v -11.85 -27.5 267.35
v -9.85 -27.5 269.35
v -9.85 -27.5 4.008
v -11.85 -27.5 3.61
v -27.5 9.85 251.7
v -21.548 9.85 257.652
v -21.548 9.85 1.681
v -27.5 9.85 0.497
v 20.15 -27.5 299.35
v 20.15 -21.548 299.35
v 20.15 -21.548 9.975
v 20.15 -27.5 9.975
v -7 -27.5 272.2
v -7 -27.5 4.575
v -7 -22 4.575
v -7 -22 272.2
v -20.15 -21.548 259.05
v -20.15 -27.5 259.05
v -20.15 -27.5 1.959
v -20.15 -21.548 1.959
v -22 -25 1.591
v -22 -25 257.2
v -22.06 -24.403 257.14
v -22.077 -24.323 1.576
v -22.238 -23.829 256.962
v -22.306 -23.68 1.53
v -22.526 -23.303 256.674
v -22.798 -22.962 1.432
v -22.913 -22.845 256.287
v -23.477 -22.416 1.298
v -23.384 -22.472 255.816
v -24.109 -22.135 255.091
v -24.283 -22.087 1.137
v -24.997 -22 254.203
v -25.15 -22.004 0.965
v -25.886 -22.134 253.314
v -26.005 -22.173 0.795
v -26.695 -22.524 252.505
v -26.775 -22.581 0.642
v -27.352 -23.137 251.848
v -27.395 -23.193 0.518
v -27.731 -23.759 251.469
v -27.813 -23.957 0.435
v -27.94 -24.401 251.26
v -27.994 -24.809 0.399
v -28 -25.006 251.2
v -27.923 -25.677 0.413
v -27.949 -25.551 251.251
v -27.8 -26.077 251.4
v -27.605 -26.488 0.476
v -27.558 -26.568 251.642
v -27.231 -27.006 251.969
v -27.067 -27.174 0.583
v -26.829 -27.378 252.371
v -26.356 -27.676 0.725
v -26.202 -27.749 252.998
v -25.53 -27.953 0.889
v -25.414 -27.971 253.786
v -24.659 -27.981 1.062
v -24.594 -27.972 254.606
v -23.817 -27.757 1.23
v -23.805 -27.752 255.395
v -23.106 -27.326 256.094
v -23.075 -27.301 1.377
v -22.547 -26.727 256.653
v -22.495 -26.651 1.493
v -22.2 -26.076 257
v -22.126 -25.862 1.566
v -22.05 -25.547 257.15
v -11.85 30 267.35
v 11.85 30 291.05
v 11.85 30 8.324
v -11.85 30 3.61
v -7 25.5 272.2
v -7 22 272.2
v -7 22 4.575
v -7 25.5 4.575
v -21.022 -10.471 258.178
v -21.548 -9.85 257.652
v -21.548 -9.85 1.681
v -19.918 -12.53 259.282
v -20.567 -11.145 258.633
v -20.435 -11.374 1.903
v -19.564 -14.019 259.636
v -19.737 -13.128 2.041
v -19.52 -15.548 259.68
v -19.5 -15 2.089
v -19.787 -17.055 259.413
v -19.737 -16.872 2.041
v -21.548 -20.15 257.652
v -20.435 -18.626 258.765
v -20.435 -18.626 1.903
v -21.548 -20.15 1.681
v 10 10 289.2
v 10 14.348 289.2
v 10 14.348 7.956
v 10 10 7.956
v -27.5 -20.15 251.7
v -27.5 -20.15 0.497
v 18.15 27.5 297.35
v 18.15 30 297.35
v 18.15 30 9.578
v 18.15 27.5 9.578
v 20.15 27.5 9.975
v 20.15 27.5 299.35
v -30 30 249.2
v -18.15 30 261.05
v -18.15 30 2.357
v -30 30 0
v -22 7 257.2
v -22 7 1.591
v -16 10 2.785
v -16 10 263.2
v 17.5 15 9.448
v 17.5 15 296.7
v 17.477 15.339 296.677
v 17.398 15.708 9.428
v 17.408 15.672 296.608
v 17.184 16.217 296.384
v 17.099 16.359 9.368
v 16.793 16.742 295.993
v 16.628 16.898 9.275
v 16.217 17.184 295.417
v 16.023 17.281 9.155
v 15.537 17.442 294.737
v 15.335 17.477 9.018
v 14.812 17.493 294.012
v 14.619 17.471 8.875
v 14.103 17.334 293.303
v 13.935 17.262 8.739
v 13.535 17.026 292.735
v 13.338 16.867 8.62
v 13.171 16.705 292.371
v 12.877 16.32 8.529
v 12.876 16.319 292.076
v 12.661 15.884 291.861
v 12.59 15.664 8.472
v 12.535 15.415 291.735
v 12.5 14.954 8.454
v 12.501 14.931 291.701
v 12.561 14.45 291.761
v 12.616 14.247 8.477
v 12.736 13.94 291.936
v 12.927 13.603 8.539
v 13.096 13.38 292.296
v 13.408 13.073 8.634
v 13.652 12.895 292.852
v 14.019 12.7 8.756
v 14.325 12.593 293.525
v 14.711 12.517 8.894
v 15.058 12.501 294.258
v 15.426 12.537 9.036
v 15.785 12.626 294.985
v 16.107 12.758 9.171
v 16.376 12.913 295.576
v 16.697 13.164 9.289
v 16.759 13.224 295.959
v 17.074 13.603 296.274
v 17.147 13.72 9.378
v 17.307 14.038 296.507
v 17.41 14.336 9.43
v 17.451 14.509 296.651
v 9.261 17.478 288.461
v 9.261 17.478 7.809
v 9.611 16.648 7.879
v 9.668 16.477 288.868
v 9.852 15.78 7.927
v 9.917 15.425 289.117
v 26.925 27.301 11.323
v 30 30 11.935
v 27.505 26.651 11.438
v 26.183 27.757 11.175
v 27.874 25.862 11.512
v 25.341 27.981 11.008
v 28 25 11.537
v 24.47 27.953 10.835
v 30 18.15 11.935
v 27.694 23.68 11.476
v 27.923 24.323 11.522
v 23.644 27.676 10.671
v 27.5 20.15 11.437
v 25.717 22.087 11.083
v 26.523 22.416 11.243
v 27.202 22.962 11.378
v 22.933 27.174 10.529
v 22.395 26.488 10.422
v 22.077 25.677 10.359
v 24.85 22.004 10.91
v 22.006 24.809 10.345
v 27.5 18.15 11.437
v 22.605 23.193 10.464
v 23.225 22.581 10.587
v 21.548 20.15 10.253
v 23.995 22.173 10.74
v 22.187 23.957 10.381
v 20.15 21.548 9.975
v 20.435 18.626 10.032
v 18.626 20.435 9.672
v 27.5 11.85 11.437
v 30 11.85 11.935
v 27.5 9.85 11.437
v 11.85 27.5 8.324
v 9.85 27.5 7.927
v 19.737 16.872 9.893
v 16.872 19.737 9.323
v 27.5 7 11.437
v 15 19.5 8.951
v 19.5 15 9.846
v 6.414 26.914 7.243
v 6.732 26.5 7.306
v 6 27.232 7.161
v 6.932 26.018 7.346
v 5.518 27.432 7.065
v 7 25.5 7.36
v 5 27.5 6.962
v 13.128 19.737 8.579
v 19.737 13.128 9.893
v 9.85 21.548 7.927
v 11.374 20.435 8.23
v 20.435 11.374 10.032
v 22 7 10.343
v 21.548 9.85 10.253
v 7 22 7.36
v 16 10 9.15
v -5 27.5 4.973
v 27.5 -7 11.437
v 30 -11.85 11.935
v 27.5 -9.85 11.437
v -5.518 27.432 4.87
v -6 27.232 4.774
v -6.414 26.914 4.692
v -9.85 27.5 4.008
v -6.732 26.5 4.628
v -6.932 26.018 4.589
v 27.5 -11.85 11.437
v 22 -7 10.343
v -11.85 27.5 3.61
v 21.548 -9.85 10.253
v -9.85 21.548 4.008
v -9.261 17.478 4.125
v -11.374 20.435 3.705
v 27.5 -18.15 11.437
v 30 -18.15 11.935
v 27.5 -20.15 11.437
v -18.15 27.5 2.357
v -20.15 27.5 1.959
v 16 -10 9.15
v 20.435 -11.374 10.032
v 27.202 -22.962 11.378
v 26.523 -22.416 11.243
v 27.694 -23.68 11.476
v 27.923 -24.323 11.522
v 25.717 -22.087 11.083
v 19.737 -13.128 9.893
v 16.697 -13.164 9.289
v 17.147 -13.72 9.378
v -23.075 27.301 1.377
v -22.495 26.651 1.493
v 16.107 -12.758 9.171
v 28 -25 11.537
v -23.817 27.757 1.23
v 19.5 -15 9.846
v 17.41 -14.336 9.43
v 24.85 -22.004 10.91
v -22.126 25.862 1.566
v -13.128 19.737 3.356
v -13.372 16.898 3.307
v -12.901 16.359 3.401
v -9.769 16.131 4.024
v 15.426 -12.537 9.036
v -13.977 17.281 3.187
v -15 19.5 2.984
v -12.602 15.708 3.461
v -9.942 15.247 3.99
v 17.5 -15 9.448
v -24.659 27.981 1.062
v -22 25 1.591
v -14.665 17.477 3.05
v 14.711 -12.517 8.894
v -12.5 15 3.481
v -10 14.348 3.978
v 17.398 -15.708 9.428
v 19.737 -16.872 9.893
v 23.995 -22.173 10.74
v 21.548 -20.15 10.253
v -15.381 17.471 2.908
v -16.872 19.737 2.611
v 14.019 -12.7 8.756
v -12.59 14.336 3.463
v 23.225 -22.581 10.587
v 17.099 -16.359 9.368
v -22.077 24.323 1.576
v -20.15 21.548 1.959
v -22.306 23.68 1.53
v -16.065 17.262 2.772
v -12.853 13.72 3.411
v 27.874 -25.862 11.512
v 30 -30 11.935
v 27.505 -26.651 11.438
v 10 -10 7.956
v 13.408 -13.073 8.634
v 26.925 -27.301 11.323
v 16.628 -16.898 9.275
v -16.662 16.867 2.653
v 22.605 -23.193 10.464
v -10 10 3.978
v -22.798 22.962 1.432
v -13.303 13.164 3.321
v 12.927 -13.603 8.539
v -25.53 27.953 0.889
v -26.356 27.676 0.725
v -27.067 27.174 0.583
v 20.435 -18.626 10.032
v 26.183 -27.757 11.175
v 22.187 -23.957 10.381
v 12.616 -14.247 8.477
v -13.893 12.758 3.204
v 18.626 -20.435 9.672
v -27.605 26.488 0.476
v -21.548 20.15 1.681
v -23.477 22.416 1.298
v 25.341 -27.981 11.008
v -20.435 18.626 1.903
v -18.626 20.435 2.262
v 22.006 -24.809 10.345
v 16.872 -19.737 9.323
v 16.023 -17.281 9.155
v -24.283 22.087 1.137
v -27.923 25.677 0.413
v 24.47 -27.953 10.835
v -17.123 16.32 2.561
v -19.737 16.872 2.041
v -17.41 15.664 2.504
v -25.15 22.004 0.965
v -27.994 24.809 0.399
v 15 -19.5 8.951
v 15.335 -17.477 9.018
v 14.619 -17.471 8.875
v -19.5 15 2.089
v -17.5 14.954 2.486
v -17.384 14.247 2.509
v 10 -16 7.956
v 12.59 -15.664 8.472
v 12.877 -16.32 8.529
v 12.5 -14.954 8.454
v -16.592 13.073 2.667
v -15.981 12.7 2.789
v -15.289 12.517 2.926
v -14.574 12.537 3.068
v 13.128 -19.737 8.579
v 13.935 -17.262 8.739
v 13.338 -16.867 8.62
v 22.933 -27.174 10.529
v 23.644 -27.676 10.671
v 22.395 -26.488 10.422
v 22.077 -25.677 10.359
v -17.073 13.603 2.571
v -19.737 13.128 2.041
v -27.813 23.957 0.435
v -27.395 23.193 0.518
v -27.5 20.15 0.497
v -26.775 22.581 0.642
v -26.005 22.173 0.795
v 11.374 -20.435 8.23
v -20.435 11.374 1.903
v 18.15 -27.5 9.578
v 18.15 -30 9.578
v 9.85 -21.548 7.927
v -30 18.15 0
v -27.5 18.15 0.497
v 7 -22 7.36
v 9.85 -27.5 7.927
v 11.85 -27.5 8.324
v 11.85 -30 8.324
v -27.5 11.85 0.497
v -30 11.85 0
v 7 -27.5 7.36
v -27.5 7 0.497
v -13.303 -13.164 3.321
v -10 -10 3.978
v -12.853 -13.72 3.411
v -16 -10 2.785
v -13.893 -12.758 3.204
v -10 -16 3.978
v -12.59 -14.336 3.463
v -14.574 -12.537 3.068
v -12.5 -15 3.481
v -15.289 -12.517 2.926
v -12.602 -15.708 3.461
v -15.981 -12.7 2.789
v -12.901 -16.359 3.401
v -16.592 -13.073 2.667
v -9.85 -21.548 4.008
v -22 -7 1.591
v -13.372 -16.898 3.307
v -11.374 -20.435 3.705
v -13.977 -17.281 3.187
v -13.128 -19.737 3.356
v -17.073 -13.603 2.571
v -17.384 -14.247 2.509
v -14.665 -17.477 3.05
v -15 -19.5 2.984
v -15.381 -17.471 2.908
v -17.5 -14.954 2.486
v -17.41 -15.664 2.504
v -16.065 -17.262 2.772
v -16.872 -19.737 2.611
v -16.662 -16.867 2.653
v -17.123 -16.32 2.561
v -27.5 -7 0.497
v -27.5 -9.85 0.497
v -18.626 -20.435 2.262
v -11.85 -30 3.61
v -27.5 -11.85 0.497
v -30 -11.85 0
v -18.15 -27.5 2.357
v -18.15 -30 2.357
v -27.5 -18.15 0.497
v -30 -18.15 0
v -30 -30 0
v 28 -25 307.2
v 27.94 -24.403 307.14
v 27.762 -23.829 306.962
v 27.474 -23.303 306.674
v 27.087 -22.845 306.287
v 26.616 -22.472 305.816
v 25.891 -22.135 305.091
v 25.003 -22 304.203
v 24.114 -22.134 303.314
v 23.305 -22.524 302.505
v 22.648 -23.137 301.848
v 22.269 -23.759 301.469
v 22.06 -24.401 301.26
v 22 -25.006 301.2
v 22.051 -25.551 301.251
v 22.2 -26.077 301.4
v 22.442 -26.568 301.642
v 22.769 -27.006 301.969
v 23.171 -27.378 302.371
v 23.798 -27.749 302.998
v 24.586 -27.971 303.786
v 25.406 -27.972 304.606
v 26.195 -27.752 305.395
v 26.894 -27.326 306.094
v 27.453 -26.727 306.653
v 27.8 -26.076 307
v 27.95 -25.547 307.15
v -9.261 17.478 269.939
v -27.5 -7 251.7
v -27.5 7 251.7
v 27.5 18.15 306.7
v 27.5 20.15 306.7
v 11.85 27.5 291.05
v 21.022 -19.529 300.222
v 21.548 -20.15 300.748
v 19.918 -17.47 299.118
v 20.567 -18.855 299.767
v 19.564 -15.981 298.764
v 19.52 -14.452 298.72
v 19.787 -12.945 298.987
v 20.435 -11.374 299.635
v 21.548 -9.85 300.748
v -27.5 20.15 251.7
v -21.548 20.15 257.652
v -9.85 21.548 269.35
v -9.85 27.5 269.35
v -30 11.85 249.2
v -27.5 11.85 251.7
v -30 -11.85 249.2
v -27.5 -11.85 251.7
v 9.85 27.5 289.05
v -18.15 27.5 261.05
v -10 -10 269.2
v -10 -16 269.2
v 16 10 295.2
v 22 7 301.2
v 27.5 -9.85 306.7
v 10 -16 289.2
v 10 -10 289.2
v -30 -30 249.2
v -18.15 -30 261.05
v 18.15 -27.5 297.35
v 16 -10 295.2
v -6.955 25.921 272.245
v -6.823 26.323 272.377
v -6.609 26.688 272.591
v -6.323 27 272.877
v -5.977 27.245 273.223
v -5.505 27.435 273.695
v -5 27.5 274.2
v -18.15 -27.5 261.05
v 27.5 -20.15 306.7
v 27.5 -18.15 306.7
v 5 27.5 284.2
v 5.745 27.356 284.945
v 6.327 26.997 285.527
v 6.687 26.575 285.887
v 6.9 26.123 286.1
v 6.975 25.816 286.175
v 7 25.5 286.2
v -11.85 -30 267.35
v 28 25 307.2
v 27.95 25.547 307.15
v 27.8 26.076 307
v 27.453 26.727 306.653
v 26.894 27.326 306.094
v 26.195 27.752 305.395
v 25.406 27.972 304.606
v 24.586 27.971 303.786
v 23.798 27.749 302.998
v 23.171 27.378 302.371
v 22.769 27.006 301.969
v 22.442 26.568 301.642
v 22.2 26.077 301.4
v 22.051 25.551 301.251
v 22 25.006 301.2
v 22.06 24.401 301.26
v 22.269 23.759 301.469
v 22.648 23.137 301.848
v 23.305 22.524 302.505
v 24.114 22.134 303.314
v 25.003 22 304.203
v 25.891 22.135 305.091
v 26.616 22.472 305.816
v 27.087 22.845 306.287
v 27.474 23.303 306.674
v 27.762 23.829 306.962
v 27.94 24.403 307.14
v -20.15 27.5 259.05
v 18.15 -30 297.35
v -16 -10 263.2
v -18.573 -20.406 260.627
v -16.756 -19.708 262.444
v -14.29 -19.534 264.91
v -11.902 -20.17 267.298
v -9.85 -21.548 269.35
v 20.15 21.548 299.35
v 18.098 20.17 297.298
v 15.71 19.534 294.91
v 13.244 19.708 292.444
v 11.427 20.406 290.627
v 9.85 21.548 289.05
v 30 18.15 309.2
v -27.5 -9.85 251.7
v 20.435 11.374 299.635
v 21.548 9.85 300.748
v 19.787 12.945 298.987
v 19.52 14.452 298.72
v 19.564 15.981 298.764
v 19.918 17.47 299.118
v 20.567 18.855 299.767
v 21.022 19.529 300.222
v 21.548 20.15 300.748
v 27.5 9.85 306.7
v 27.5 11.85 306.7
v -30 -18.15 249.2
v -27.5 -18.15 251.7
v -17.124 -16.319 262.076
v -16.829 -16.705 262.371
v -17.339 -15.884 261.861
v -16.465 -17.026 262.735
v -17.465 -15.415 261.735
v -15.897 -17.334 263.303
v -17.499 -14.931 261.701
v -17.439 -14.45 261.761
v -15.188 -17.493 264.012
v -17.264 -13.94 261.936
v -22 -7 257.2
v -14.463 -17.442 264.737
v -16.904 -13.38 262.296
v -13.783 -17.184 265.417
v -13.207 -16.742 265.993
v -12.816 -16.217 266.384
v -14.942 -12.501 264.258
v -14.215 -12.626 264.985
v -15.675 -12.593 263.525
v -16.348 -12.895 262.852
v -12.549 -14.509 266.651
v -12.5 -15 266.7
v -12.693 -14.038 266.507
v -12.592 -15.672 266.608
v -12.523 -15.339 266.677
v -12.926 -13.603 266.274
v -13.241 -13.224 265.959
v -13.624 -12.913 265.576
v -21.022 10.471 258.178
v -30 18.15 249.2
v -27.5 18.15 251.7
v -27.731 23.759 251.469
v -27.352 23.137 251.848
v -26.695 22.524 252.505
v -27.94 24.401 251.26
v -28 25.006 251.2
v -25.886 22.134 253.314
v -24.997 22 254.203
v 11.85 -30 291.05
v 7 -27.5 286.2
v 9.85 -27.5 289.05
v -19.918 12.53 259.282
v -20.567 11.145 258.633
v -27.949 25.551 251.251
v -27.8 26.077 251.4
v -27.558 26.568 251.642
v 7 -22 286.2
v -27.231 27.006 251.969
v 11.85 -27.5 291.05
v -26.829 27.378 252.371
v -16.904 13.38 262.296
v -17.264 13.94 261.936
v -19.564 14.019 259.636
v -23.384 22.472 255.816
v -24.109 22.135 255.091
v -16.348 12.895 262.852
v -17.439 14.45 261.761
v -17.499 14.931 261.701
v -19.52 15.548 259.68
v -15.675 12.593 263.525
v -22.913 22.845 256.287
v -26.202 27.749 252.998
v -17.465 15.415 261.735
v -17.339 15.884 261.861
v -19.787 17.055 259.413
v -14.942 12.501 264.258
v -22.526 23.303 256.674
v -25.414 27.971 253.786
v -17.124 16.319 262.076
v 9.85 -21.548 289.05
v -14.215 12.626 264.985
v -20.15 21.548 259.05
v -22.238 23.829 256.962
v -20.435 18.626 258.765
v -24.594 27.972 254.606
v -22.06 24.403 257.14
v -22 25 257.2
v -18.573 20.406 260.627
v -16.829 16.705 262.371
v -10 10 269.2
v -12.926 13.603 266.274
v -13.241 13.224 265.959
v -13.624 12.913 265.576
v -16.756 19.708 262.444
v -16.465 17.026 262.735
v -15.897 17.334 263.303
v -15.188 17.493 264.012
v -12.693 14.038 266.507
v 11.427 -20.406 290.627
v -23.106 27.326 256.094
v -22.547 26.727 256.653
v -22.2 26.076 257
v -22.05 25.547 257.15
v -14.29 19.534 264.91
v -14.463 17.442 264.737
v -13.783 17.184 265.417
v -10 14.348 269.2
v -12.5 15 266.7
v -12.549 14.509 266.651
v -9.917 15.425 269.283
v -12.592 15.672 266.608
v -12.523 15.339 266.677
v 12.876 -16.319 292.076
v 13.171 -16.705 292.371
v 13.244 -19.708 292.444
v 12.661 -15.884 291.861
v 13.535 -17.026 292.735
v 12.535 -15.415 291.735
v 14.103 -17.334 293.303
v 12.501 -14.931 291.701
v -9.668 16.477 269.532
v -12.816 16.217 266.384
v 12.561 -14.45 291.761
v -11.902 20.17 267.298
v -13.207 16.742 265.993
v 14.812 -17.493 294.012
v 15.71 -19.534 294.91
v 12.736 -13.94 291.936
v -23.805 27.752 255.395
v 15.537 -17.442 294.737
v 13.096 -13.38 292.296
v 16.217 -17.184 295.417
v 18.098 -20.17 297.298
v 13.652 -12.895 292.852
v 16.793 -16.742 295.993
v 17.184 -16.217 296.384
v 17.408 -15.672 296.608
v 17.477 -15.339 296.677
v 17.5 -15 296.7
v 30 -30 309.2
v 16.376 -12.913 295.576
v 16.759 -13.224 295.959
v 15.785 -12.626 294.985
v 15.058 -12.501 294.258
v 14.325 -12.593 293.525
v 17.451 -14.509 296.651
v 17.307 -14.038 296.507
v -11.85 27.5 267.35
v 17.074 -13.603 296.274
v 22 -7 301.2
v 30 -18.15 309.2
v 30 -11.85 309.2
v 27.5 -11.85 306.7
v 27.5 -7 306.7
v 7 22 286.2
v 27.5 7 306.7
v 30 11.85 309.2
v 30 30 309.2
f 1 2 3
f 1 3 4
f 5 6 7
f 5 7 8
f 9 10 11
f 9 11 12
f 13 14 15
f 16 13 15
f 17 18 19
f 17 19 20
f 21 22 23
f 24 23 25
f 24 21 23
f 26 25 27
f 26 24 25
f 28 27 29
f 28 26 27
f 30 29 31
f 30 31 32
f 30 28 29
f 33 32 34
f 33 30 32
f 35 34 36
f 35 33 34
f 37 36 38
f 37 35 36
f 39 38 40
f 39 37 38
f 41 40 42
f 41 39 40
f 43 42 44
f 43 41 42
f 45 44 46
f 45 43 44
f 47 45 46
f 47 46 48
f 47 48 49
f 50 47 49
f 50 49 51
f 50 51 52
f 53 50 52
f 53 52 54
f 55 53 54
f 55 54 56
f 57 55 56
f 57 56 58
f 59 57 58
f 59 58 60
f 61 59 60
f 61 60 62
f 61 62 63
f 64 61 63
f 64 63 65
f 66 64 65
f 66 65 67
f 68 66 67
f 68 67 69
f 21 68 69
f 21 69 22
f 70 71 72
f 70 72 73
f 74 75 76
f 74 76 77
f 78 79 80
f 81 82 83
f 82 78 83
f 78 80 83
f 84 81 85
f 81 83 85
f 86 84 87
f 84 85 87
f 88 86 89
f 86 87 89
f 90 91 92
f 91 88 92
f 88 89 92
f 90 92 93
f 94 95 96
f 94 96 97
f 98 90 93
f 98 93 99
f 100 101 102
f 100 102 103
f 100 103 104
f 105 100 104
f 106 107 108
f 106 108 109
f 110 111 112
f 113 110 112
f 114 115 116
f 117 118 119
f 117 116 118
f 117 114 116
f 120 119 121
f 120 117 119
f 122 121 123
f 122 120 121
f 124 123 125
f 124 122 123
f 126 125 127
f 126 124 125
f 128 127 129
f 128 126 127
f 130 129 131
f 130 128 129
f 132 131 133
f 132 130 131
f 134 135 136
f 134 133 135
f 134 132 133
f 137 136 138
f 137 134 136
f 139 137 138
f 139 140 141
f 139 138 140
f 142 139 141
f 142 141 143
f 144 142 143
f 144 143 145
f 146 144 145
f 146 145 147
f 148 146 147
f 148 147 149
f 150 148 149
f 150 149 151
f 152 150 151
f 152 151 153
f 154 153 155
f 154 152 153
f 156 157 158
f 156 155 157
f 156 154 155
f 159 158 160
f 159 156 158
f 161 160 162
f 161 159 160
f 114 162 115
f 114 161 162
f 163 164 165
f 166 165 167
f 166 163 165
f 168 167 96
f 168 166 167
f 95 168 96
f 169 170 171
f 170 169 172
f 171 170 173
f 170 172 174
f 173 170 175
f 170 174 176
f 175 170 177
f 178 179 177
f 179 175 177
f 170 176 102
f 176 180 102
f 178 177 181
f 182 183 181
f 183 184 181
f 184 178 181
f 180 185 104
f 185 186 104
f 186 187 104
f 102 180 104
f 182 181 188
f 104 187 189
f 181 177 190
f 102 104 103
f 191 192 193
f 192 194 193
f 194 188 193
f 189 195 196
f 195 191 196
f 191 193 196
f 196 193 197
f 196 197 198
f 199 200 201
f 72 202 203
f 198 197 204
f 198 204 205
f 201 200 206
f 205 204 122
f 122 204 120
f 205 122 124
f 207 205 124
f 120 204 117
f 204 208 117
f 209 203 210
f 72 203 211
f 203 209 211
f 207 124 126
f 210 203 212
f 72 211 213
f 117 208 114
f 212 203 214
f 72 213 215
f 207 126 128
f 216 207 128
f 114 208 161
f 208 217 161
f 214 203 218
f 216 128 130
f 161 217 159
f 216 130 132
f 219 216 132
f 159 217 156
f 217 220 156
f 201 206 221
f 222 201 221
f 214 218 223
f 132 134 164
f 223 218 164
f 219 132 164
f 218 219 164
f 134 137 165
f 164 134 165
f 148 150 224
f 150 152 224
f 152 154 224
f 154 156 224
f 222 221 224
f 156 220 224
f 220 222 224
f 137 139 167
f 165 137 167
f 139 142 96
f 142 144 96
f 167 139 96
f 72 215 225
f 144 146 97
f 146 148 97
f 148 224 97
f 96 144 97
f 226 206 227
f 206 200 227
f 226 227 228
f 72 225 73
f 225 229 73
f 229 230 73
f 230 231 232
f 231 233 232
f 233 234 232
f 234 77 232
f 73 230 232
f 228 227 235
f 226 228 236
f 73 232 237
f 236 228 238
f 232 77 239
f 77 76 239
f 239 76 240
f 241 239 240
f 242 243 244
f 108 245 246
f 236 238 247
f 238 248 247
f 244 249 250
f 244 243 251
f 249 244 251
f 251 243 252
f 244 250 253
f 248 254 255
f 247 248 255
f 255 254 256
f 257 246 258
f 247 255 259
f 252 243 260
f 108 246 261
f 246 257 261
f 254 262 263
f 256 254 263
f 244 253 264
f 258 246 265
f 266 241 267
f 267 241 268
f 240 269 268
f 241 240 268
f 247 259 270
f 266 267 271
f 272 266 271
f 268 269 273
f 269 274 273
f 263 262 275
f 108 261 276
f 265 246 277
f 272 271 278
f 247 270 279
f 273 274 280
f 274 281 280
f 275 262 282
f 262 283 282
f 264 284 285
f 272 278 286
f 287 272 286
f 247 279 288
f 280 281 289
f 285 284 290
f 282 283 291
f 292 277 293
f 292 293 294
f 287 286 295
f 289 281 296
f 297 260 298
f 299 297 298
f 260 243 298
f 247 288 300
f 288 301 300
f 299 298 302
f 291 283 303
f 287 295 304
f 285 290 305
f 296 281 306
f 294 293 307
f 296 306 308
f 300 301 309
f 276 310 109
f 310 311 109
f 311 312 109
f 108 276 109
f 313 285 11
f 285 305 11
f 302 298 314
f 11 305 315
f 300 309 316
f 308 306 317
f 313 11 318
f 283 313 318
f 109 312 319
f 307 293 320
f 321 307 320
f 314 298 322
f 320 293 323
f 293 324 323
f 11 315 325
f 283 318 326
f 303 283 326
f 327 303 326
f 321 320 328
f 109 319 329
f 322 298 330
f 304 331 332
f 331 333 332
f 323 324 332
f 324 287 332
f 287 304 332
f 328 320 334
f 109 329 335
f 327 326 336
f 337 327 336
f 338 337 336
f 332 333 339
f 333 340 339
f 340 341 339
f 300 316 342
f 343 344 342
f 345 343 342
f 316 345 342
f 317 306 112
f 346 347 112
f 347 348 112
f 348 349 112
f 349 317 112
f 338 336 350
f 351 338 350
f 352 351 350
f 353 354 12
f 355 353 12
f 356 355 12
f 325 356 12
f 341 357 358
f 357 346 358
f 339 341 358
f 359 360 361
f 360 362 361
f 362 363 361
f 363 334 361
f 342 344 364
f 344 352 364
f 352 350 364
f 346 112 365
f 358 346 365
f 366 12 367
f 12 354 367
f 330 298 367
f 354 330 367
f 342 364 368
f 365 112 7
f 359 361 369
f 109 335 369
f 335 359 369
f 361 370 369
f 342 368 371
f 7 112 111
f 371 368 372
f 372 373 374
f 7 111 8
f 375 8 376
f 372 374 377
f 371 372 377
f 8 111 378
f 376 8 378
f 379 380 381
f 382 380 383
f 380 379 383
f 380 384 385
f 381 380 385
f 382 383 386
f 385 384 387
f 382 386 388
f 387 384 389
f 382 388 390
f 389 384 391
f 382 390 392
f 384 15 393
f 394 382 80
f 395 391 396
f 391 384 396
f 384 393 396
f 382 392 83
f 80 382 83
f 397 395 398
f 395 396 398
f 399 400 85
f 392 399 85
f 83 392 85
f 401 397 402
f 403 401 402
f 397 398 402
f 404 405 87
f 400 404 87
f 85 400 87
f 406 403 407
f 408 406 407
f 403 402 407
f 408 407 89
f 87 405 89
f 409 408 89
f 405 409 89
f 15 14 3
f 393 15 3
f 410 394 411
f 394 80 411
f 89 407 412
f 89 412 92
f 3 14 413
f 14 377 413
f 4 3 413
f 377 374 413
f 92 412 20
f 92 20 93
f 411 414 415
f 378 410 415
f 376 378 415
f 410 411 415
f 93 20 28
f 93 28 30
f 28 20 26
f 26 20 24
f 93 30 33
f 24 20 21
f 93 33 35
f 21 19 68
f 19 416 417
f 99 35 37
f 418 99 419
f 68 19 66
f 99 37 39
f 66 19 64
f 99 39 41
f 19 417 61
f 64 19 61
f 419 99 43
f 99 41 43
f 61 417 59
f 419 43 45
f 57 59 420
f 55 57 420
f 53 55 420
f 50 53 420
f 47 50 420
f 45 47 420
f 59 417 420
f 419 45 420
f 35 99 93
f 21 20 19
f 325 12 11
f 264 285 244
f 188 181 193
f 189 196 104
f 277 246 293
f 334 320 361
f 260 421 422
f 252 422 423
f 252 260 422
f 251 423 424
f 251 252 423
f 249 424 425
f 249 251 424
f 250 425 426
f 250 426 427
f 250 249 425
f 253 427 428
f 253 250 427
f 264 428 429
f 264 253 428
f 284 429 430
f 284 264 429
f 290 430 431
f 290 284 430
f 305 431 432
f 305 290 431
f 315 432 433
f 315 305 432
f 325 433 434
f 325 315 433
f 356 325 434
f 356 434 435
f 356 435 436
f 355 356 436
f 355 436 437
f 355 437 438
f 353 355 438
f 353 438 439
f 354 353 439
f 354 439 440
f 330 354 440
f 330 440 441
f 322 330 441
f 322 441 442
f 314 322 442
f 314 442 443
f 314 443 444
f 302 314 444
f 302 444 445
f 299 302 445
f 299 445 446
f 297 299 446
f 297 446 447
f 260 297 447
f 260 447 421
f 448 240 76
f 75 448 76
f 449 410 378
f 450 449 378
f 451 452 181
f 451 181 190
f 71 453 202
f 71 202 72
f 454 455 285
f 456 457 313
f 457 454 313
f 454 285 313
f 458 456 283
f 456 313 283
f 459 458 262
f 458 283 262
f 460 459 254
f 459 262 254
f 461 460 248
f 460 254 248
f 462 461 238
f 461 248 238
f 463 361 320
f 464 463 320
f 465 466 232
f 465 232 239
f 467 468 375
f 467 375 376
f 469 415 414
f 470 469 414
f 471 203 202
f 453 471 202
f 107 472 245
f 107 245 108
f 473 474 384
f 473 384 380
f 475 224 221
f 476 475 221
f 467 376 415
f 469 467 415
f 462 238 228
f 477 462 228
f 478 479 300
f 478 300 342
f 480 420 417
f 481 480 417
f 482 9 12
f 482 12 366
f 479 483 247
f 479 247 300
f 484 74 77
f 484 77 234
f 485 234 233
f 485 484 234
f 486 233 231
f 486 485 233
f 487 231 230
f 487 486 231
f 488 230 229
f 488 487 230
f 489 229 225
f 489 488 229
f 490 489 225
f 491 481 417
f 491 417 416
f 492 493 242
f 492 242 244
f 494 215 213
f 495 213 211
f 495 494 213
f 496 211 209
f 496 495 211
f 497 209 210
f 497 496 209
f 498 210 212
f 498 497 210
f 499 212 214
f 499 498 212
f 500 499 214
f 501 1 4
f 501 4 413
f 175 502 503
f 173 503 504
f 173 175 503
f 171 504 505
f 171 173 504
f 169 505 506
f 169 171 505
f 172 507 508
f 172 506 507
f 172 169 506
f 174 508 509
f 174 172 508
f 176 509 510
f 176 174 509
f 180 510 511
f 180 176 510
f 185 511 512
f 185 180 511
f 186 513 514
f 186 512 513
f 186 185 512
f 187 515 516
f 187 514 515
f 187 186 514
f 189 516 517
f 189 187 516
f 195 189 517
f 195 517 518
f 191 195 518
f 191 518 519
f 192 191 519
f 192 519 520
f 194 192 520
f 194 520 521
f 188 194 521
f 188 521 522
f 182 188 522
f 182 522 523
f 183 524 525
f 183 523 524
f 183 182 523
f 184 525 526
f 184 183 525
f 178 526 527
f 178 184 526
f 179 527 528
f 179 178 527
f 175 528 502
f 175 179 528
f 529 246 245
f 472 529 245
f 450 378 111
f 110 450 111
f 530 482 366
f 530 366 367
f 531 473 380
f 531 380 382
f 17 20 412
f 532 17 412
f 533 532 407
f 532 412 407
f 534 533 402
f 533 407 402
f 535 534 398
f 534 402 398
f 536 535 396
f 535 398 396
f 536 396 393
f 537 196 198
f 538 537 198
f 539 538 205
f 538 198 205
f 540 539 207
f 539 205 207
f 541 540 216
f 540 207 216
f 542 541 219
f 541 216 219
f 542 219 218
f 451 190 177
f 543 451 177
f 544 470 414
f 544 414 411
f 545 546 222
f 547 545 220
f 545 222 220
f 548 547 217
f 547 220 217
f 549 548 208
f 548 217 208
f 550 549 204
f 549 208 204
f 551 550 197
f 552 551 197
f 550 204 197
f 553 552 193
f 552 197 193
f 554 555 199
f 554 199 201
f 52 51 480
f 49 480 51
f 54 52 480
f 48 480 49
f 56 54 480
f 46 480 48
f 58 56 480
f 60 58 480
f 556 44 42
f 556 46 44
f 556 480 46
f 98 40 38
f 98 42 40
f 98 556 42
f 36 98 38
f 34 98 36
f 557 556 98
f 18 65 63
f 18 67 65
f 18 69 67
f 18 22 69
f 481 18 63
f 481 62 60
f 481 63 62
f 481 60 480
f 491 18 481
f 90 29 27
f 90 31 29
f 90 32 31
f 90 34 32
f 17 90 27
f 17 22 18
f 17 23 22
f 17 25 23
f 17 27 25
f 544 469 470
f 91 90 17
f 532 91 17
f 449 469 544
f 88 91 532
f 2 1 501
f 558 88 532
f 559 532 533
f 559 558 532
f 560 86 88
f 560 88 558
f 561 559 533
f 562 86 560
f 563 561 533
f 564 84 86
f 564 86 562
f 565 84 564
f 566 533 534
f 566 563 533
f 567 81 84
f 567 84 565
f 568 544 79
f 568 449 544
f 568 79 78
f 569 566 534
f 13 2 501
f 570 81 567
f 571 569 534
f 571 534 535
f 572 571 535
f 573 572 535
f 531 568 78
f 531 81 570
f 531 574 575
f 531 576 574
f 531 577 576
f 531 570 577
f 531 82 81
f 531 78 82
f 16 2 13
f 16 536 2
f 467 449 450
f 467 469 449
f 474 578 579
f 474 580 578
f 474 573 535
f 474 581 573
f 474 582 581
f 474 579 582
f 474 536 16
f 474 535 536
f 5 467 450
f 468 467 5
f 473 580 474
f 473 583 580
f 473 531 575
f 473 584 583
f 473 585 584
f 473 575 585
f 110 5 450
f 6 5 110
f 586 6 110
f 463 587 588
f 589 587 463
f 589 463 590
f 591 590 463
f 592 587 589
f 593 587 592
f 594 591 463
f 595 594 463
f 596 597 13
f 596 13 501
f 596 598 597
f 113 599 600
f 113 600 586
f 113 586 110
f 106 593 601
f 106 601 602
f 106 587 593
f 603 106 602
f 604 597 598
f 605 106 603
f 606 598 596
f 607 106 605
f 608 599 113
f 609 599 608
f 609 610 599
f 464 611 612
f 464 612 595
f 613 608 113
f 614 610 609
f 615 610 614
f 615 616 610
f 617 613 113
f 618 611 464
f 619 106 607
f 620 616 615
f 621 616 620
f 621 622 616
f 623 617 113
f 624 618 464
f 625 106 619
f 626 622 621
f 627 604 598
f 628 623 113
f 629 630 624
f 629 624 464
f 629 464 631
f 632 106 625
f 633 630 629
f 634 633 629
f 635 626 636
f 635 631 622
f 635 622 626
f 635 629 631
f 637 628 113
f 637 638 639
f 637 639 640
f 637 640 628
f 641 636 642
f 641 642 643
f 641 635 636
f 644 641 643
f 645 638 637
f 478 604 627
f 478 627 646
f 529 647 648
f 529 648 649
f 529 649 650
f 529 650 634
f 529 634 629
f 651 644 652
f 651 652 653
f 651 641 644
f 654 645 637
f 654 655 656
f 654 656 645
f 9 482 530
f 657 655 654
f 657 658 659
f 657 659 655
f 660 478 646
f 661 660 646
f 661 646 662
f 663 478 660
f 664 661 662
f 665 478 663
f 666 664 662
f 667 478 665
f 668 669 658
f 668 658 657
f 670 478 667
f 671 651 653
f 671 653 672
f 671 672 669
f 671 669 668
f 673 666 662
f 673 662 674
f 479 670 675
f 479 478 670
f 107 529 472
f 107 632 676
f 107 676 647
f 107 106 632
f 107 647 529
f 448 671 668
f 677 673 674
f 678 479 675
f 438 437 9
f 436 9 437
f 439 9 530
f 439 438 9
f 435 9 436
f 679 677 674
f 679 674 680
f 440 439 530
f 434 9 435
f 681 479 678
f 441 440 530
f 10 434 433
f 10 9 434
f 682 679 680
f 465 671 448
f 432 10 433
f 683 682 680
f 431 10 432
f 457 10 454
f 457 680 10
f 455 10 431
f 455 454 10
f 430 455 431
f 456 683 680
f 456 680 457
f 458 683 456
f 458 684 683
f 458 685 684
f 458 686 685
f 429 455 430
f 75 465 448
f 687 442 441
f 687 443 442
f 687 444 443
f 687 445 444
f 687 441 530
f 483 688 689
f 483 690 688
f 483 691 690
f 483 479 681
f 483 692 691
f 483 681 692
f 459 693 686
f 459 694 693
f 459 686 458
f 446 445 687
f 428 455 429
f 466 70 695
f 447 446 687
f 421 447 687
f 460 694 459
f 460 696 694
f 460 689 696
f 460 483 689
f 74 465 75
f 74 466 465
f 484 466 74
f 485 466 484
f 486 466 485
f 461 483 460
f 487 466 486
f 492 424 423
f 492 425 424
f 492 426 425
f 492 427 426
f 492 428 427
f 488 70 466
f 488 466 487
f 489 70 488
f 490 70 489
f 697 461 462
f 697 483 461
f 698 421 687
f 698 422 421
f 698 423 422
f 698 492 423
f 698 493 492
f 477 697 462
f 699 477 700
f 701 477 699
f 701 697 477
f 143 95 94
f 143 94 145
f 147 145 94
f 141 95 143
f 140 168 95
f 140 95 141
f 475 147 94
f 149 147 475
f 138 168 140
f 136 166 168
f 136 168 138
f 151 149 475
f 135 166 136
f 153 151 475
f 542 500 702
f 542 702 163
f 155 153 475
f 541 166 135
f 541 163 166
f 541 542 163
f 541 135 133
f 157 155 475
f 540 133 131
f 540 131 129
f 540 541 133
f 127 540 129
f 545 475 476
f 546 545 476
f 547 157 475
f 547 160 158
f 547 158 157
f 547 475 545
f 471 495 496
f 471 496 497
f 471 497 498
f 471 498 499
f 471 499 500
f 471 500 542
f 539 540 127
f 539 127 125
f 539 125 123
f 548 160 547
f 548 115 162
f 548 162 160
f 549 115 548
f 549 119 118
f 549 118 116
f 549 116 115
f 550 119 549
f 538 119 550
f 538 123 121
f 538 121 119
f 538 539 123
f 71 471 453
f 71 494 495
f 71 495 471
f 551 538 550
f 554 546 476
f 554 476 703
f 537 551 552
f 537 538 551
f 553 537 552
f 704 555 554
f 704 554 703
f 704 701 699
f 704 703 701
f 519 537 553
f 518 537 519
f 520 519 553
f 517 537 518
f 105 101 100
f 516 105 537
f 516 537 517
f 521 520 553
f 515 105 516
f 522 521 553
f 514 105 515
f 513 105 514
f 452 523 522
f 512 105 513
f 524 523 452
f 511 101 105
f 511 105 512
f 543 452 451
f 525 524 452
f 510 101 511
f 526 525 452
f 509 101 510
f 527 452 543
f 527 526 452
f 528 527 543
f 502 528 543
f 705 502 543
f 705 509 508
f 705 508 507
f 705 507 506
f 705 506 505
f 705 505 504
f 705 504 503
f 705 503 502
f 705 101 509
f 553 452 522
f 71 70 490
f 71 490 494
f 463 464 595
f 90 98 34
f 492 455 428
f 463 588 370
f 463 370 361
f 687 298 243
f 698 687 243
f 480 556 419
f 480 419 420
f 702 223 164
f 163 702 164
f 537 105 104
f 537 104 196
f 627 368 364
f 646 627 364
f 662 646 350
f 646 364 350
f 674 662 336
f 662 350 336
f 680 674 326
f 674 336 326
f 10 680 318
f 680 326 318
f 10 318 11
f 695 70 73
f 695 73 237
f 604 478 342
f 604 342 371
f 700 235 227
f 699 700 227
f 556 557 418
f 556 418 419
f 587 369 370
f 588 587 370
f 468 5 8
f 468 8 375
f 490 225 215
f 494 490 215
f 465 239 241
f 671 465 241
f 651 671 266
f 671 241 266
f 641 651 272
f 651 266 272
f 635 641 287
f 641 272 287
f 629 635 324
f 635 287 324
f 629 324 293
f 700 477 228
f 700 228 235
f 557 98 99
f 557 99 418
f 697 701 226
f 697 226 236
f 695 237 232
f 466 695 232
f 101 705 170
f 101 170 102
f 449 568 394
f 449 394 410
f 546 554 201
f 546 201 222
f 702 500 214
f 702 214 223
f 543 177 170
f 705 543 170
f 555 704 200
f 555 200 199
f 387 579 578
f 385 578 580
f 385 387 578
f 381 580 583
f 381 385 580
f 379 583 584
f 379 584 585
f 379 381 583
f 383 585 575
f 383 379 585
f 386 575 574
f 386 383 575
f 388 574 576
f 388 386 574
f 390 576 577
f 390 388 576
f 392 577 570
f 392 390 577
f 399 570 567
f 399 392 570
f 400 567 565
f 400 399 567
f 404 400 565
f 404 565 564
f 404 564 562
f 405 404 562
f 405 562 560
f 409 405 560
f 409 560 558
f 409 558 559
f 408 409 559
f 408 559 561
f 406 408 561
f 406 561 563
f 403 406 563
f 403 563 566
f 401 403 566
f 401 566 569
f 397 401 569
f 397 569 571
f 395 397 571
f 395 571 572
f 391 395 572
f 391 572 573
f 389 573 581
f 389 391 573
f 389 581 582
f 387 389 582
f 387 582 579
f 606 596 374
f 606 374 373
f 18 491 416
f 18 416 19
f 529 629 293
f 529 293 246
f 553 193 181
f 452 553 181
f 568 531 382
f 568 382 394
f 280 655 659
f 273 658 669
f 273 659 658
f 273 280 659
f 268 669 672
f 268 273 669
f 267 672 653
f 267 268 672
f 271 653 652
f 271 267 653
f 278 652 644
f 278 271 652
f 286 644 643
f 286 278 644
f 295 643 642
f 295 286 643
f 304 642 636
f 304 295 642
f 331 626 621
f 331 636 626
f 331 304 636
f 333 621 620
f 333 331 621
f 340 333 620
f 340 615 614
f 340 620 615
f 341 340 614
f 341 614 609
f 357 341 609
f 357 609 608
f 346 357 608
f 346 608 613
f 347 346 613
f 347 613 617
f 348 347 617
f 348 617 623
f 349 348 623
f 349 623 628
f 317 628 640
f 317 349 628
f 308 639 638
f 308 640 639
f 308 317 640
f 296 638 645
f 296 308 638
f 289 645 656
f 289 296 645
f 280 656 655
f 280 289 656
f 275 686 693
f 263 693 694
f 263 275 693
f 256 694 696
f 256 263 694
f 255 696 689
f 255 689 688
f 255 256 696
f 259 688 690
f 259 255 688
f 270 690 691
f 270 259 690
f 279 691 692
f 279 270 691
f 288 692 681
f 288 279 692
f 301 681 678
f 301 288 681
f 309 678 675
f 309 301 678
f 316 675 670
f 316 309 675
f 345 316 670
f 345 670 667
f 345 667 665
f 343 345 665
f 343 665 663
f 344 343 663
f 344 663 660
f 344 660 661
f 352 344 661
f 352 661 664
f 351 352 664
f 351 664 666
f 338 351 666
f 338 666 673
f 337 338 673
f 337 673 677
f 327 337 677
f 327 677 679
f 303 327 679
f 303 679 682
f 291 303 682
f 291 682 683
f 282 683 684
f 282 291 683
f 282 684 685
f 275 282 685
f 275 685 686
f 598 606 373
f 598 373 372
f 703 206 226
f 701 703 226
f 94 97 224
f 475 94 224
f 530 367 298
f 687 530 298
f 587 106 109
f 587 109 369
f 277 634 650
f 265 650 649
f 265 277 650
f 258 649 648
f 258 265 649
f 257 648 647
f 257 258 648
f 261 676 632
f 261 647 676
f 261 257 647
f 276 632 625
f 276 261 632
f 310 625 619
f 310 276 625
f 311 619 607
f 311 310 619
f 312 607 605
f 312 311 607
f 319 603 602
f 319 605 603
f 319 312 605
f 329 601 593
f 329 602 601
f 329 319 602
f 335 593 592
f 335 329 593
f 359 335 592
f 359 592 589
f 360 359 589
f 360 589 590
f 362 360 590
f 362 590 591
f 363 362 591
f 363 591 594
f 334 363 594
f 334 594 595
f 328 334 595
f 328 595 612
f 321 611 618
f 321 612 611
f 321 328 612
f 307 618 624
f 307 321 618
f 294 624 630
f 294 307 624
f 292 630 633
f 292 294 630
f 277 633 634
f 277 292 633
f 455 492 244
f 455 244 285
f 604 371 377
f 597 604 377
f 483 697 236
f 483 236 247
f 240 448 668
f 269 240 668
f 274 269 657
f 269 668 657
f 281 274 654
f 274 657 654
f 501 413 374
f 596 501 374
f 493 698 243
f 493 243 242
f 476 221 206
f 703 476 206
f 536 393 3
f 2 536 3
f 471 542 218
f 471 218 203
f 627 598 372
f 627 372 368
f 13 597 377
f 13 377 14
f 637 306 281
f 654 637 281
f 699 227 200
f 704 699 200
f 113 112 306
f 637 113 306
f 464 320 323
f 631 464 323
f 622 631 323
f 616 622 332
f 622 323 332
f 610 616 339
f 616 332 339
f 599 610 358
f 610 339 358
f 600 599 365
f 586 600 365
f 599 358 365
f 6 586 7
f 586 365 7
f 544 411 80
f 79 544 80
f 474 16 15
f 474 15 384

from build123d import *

# Parameters (mm, degrees)
F0_R          = 3
F0_R_2        = 2.5
F1_DEPTH      = 309.2
F2_R          = 2
F3_R          = 7
F6_DEPTH      = 30
F6_DEPTH_BACK = 30


# Not quite as in the source:
# - a feature names something its author has since deleted; it is built from what else it names


with BuildPart() as f1:
    # F0 (on Top) → F1 (new body)
    with BuildSketch(Plane.XY):
        with BuildLine():
            Line((18.15, -30), (30, -30))
            Line((30, -30), (30, -18.15))
            Line((30, -18.15), (27.5, -18.15))
            Line((27.5, -18.15), (27.5, -20.15))
            Line((27.5, -20.15), (21.5477069044, -20.15))
            ThreePointArc((21.5477069044, -20.15), (19.5, -15), (21.5477069044, -9.85))
            Line((21.5477069044, -9.85), (27.5, -9.85))
            Line((27.5, -9.85), (27.5, -11.85))
            Line((27.5, -11.85), (30, -11.85))
            Line((30, -11.85), (30, 11.85))
            Line((30, 11.85), (27.5, 11.85))
            Line((27.5, 11.85), (27.5, 9.85))
            Line((27.5, 9.85), (21.5477069044, 9.85))
            ThreePointArc((21.5477069044, 9.85), (19.5, 15), (21.5477069044, 20.15))
            Line((21.5477069044, 20.15), (27.5, 20.15))
            Line((27.5, 20.15), (27.5, 18.15))
            Line((27.5, 18.15), (30, 18.15))
            Line((30, 18.15), (30, 30))
            Line((30, 30), (18.15, 30))
            Line((18.15, 30), (18.15, 27.5))
            Line((18.15, 27.5), (20.15, 27.5))
            Line((20.15, 27.5), (20.15, 21.5477069044))
            ThreePointArc((20.15, 21.5477069044), (15, 19.5), (9.85, 21.5477069044))
            Line((9.85, 21.5477069044), (9.85, 27.5))
            Line((9.85, 27.5), (11.85, 27.5))
            Line((11.85, 27.5), (11.85, 30))
            Line((11.85, 30), (-11.85, 30))
            Line((-11.85, 30), (-11.85, 27.5))
            Line((-11.85, 27.5), (-9.85, 27.5))
            Line((-9.85, 27.5), (-9.85, 21.5477069044))
            ThreePointArc((-9.85, 21.5477069044), (-15, 19.5), (-20.15, 21.5477069044))
            Line((-20.15, 21.5477069044), (-20.15, 27.5))
            Line((-20.15, 27.5), (-18.15, 27.5))
            Line((-18.15, 27.5), (-18.15, 30))
            Line((-18.15, 30), (-30, 30))
            Line((-30, 30), (-30, 18.15))
            Line((-30, 18.15), (-27.5, 18.15))
            Line((-27.5, 18.15), (-27.5, 20.15))
            Line((-27.5, 20.15), (-21.5477069044, 20.15))
            ThreePointArc((-21.5477069044, 20.15), (-19.5, 15), (-21.5477069044, 9.85))
            Line((-21.5477069044, 9.85), (-27.5, 9.85))
            Line((-27.5, 9.85), (-27.5, 11.85))
            Line((-27.5, 11.85), (-30, 11.85))
            Line((-30, 11.85), (-30, -11.85))
            Line((-30, -11.85), (-27.5, -11.85))
            Line((-27.5, -11.85), (-27.5, -9.85))
            Line((-27.5, -9.85), (-21.5477069044, -9.85))
            ThreePointArc((-21.5477069044, -9.85), (-19.5, -15), (-21.5477069044, -20.15))
            Line((-21.5477069044, -20.15), (-27.5, -20.15))
            Line((-27.5, -20.15), (-27.5, -18.15))
            Line((-27.5, -18.15), (-30, -18.15))
            Line((-30, -18.15), (-30, -30))
            Line((-30, -30), (-18.15, -30))
            Line((-18.15, -30), (-18.15, -27.5))
            Line((-18.15, -27.5), (-20.15, -27.5))
            Line((-20.15, -27.5), (-20.15, -21.5477069044))
            ThreePointArc((-20.15, -21.5477069044), (-15, -19.5), (-9.85, -21.5477069044))
            Line((-9.85, -21.5477069044), (-9.85, -27.5))
            Line((-9.85, -27.5), (-11.85, -27.5))
            Line((-11.85, -27.5), (-11.85, -30))
            Line((-11.85, -30), (11.85, -30))
            Line((11.85, -30), (11.85, -27.5))
            Line((11.85, -27.5), (9.85, -27.5))
            Line((9.85, -27.5), (9.85, -21.5477069044))
            ThreePointArc((9.85, -21.5477069044), (15, -19.5), (20.15, -21.5477069044))
            Line((20.15, -21.5477069044), (20.15, -27.5))
            Line((20.15, -27.5), (18.15, -27.5))
            Line((18.15, -27.5), (18.15, -30))
        make_face()
        with Locations((-25, -25)):
            Circle(F0_R, mode=Mode.SUBTRACT)
        with Locations((-15, -15)):
            Circle(F0_R_2, mode=Mode.SUBTRACT)
        with Locations((25, -25)):
            Circle(F0_R, mode=Mode.SUBTRACT)
        with Locations((15, -15)):
            Circle(F0_R_2, mode=Mode.SUBTRACT)
        with Locations((-25, 25)):
            Circle(F0_R, mode=Mode.SUBTRACT)
        with Locations((-15, 15)):
            Circle(F0_R_2, mode=Mode.SUBTRACT)
        Polygon((-7, 22), (-7, 27.5), (0, 27.5), (7, 27.5), (7, 22), (10, 16), (10, 10), (16, 10), (22, 7), (27.5, 7), (27.5, 0), (27.5, -7), (22, -7), (16, -10), (10, -10), (10, -16), (7, -22), (7, -27.5), (0, -27.5), (-7, -27.5), (-7, -22), (-10, -16), (-10, -10), (-16, -10), (-22, -7), (-27.5, -7), (-27.5, 0), (-27.5, 7), (-22, 7), (-16, 10), (-10, 10), (-10, 16), align=None, mode=Mode.SUBTRACT)
        with Locations((15, 15)):
            Circle(F0_R_2, mode=Mode.SUBTRACT)
        with Locations((25, 25)):
            Circle(F0_R, mode=Mode.SUBTRACT)
    extrude(amount=F1_DEPTH)

    # F2
    f2_edges = [f1.edges().sort_by_distance(p)[0] for p in [
        (-7, 27.5, 154.6),
        (7, 27.5, 154.6),
    ]]
    fillet(f2_edges, radius=F2_R)

    # F3
    f3_edges = [f1.edges().sort_by_distance(p)[0] for p in [
        (-10, 16, 154.6),
        (10, 16, 154.6),
    ]]
    fillet(f3_edges, radius=F3_R)

    # F5 (on Front) → F6 (cut, two sides)
    with BuildSketch(Plane.XZ) as f6_sk:
        Polygon((199.6708250374, -78.6542790774), (175.8796550084, 40.952009573), (-30, 0), (-6.208829971, -119.6062886505), align=None)
        Polygon((30, 309.2), (-52.0743704197, 391.2743704197), (-206.6919281066, 236.6568127329), (-124.6175576868, 154.5824423132), align=None)
    extrude(amount=F6_DEPTH, mode=Mode.SUBTRACT)
    extrude(f6_sk.sketch, amount=-F6_DEPTH_BACK, mode=Mode.SUBTRACT)


solid = f1.part
